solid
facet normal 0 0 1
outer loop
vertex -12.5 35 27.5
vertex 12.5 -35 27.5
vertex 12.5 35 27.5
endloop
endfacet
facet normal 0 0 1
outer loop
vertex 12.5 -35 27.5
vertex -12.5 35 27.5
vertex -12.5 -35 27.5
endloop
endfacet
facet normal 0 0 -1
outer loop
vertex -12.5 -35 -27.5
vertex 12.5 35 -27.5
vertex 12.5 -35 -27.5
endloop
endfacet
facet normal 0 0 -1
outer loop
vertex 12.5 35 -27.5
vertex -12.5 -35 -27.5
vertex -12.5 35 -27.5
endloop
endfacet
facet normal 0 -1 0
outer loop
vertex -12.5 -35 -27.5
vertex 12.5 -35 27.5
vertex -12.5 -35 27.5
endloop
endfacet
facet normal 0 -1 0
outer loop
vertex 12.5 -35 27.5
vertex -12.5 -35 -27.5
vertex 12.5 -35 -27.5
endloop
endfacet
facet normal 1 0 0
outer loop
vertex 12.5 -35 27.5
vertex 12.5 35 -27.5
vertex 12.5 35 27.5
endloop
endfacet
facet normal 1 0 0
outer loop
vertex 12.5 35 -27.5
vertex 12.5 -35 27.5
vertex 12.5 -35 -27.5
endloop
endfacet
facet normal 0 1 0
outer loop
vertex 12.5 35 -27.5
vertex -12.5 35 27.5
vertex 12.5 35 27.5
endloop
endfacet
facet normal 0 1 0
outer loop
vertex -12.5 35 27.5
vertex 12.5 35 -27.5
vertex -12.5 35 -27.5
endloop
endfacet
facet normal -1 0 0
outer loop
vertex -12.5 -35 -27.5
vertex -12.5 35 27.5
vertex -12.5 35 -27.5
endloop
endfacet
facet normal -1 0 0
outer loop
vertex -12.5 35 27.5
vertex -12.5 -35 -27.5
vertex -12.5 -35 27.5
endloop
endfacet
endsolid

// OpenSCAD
// ========================================
// a 25 x 70 x 55 mm box
// NeuroCAD canonical IR; dimensions are millimetres
// ========================================
$fn = 48;

cube(size=[25, 70, 55], center=true);
